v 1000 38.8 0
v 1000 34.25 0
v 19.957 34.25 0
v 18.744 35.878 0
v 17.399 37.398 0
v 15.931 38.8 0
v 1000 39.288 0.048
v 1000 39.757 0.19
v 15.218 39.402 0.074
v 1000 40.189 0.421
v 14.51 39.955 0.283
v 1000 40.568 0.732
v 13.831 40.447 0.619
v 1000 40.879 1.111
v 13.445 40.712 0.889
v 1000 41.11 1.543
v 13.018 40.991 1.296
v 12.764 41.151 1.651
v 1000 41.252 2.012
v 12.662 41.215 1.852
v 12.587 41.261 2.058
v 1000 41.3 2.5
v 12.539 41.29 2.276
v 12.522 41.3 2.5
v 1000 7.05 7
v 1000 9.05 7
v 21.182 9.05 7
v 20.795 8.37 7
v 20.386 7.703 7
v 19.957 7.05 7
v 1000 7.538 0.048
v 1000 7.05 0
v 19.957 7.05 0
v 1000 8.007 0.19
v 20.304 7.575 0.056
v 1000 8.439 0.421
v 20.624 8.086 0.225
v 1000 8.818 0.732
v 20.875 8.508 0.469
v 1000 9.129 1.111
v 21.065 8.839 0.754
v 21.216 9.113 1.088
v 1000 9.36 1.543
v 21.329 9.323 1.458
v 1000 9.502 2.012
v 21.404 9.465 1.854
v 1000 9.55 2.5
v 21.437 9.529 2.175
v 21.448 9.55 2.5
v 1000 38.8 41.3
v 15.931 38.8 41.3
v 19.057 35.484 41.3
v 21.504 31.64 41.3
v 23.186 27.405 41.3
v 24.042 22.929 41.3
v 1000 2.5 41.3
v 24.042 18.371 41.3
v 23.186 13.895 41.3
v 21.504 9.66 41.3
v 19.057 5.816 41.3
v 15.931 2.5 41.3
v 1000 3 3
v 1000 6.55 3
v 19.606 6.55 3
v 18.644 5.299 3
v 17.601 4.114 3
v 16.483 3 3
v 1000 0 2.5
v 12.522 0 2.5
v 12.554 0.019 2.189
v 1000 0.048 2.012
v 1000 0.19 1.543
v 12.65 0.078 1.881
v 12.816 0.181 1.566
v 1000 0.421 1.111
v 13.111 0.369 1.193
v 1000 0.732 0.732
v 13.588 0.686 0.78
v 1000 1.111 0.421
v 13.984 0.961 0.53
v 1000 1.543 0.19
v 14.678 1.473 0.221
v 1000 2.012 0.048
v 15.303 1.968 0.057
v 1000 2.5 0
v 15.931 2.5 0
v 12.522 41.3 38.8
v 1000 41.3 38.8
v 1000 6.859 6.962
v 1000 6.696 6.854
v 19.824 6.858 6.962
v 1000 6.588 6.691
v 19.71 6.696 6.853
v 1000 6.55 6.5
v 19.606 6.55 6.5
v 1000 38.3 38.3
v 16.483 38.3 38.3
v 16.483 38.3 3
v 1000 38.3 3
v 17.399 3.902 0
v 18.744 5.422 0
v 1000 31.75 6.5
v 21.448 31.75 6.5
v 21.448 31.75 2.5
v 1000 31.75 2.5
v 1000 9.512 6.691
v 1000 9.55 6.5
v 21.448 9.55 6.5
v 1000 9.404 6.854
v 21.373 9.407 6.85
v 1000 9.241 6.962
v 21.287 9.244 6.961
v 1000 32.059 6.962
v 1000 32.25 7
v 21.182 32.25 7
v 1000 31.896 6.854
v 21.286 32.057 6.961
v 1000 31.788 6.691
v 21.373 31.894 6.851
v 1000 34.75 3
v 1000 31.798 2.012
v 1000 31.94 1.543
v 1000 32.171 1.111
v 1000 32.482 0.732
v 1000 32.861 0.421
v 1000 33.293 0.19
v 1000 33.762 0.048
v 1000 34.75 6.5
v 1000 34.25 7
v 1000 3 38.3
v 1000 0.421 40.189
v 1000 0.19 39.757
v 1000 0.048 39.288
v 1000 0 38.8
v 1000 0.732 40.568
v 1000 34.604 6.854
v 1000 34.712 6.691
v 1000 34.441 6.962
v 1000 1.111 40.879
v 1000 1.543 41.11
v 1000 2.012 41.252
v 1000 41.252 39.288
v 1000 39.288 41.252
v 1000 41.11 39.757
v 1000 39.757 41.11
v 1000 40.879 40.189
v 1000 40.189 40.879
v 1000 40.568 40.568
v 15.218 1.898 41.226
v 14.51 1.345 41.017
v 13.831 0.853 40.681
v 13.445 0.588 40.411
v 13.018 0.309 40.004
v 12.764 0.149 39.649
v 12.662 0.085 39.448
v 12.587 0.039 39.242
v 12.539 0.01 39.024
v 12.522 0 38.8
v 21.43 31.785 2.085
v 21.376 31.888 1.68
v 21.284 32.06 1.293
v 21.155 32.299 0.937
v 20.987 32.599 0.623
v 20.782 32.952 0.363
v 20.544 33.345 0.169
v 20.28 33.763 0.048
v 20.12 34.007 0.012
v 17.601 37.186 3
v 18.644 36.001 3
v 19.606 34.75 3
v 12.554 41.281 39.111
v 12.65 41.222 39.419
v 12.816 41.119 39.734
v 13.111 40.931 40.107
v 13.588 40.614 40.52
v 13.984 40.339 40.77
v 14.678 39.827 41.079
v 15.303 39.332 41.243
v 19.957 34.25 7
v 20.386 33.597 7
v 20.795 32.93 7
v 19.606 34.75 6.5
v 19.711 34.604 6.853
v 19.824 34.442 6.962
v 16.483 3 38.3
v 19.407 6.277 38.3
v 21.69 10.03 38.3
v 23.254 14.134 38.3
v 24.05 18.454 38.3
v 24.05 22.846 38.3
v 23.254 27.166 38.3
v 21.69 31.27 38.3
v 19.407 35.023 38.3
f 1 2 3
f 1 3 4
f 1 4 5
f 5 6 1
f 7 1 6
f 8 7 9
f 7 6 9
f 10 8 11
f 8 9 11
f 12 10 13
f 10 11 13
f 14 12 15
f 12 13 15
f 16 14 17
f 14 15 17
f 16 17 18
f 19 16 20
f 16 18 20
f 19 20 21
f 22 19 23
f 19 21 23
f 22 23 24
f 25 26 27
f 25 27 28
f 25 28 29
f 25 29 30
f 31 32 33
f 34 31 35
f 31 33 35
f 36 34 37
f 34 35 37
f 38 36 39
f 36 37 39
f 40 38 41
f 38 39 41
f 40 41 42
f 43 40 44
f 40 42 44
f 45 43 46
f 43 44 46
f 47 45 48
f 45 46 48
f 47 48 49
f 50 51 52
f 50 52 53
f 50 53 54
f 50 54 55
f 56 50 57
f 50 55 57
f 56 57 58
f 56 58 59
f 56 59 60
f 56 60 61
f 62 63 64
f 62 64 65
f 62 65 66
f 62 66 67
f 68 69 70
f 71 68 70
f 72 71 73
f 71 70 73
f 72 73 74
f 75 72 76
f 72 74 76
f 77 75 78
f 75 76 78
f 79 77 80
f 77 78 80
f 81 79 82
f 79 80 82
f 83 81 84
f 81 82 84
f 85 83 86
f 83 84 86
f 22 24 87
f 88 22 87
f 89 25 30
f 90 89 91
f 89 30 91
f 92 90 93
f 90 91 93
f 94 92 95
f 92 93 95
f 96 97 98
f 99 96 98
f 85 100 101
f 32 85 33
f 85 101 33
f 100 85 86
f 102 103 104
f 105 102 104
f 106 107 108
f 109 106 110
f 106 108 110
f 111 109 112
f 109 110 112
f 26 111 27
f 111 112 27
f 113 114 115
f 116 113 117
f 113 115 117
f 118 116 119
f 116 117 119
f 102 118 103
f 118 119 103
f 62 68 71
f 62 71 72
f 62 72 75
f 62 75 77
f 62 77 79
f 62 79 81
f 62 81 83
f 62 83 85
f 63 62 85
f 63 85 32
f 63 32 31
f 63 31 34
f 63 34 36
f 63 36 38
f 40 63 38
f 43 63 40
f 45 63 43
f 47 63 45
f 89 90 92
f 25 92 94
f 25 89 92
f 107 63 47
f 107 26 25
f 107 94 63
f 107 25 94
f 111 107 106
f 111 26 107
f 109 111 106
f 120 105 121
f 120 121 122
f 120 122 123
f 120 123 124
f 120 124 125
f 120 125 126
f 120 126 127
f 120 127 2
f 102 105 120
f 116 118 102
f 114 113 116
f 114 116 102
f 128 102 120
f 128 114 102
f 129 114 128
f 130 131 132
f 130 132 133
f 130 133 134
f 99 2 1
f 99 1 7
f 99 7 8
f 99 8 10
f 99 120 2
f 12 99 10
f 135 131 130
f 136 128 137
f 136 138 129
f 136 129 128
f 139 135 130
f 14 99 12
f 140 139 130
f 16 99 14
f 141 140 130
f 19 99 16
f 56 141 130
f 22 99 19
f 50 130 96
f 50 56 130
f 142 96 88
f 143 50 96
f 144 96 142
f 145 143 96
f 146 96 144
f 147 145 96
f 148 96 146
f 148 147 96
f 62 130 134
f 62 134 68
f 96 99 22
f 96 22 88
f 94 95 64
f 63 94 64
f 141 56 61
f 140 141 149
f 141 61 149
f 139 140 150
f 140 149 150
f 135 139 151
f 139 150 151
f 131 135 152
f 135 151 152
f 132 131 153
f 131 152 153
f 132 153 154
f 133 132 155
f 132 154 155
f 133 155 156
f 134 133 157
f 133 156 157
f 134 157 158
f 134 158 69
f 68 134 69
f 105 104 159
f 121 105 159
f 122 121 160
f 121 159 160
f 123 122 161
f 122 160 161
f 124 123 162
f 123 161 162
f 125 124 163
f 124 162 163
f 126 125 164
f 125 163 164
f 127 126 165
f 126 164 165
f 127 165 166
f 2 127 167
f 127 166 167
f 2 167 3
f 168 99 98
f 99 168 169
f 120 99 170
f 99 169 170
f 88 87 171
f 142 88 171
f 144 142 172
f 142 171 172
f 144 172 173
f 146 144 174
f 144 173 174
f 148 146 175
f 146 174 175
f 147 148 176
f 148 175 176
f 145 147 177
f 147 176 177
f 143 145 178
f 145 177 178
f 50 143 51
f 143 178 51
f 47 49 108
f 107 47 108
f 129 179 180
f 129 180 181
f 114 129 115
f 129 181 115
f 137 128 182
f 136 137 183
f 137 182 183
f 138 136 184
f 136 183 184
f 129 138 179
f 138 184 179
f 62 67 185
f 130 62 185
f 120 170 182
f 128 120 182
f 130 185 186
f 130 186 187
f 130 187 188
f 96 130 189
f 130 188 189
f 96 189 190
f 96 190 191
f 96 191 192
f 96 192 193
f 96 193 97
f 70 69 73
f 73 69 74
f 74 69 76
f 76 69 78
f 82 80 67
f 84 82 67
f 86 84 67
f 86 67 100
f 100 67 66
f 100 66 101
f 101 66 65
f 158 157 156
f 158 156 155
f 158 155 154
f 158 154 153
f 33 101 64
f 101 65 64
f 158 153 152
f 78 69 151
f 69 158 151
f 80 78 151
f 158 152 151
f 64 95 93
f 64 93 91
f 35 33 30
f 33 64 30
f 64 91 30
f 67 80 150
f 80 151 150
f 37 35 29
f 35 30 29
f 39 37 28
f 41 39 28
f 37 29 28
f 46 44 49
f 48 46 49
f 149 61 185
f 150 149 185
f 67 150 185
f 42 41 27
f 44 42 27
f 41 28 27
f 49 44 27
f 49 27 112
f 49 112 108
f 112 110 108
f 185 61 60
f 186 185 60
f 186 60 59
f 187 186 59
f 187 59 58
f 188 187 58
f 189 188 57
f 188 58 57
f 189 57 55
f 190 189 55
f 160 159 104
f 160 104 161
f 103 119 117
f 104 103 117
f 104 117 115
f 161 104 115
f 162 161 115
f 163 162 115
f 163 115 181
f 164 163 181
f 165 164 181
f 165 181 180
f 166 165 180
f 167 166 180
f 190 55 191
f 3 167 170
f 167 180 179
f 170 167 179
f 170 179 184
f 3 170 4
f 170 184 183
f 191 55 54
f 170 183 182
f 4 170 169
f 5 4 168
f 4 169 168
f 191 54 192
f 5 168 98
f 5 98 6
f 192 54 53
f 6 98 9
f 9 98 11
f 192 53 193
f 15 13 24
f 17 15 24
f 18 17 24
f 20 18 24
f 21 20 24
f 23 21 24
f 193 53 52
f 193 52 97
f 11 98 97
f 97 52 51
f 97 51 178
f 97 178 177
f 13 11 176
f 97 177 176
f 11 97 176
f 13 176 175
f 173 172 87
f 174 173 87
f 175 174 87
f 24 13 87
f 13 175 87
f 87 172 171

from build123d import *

# Parameters (mm, degrees)
F1_DEPTH = 1000
F2_R     = 24.15
F3_DEPTH = 41.301


with BuildPart() as f1:
    # F0 (on Right) → F1 (new body)
    with BuildSketch(Plane.YZ):
        with BuildLine():
            Line((0, 38.8), (0, 2.5))
            ThreePointArc((0, 2.5), (0.732233, 0.732233), (2.5, 0))
            Line((2.5, 0), (7.05, 0))
            ThreePointArc((7.05, 0), (8.817767, 0.732233), (9.55, 2.5))
            Line((9.55, 2.5), (9.55, 3))
            Line((9.55, 3), (9.55, 6.5))
            ThreePointArc((9.55, 6.5), (9.403553, 6.853553), (9.05, 7))
            Line((9.05, 7), (7.05, 7))
            ThreePointArc((7.05, 7), (6.696447, 6.853553), (6.55, 6.5))
            Line((6.55, 6.5), (6.55, 3))
            Line((6.55, 3), (3, 3))
            Line((3, 3), (3, 38.3))
            Line((3, 38.3), (38.3, 38.3))
            Line((38.3, 38.3), (38.3, 3))
            Line((38.3, 3), (34.75, 3))
            Line((34.75, 3), (34.75, 6.5))
            ThreePointArc((34.75, 6.5), (34.603553, 6.853553), (34.25, 7))
            Line((34.25, 7), (32.25, 7))
            ThreePointArc((32.25, 7), (31.896447, 6.853553), (31.75, 6.5))
            Line((31.75, 6.5), (31.75, 3))
            Line((31.75, 3), (31.75, 2.5))
            ThreePointArc((31.75, 2.5), (32.482233, 0.732233), (34.25, 0))
            Line((34.25, 0), (38.8, 0))
            ThreePointArc((38.8, 0), (40.567767, 0.732233), (41.3, 2.5))
            Line((41.3, 2.5), (41.3, 38.8))
            ThreePointArc((41.3, 38.8), (40.567767, 40.567767), (38.8, 41.3))
            Line((38.8, 41.3), (2.5, 41.3))
            ThreePointArc((2.5, 41.3), (0.732233, 40.567767), (0, 38.8))
        make_face()
    extrude(amount=F1_DEPTH)

    # F2 (on face) → F3 (cut, through all)
    with BuildSketch(Plane.XY.offset(41.3)):
        with Locations((0, 20.65)):
            Circle(F2_R)
    extrude(amount=-F3_DEPTH, mode=Mode.SUBTRACT)


solid = f1.part
